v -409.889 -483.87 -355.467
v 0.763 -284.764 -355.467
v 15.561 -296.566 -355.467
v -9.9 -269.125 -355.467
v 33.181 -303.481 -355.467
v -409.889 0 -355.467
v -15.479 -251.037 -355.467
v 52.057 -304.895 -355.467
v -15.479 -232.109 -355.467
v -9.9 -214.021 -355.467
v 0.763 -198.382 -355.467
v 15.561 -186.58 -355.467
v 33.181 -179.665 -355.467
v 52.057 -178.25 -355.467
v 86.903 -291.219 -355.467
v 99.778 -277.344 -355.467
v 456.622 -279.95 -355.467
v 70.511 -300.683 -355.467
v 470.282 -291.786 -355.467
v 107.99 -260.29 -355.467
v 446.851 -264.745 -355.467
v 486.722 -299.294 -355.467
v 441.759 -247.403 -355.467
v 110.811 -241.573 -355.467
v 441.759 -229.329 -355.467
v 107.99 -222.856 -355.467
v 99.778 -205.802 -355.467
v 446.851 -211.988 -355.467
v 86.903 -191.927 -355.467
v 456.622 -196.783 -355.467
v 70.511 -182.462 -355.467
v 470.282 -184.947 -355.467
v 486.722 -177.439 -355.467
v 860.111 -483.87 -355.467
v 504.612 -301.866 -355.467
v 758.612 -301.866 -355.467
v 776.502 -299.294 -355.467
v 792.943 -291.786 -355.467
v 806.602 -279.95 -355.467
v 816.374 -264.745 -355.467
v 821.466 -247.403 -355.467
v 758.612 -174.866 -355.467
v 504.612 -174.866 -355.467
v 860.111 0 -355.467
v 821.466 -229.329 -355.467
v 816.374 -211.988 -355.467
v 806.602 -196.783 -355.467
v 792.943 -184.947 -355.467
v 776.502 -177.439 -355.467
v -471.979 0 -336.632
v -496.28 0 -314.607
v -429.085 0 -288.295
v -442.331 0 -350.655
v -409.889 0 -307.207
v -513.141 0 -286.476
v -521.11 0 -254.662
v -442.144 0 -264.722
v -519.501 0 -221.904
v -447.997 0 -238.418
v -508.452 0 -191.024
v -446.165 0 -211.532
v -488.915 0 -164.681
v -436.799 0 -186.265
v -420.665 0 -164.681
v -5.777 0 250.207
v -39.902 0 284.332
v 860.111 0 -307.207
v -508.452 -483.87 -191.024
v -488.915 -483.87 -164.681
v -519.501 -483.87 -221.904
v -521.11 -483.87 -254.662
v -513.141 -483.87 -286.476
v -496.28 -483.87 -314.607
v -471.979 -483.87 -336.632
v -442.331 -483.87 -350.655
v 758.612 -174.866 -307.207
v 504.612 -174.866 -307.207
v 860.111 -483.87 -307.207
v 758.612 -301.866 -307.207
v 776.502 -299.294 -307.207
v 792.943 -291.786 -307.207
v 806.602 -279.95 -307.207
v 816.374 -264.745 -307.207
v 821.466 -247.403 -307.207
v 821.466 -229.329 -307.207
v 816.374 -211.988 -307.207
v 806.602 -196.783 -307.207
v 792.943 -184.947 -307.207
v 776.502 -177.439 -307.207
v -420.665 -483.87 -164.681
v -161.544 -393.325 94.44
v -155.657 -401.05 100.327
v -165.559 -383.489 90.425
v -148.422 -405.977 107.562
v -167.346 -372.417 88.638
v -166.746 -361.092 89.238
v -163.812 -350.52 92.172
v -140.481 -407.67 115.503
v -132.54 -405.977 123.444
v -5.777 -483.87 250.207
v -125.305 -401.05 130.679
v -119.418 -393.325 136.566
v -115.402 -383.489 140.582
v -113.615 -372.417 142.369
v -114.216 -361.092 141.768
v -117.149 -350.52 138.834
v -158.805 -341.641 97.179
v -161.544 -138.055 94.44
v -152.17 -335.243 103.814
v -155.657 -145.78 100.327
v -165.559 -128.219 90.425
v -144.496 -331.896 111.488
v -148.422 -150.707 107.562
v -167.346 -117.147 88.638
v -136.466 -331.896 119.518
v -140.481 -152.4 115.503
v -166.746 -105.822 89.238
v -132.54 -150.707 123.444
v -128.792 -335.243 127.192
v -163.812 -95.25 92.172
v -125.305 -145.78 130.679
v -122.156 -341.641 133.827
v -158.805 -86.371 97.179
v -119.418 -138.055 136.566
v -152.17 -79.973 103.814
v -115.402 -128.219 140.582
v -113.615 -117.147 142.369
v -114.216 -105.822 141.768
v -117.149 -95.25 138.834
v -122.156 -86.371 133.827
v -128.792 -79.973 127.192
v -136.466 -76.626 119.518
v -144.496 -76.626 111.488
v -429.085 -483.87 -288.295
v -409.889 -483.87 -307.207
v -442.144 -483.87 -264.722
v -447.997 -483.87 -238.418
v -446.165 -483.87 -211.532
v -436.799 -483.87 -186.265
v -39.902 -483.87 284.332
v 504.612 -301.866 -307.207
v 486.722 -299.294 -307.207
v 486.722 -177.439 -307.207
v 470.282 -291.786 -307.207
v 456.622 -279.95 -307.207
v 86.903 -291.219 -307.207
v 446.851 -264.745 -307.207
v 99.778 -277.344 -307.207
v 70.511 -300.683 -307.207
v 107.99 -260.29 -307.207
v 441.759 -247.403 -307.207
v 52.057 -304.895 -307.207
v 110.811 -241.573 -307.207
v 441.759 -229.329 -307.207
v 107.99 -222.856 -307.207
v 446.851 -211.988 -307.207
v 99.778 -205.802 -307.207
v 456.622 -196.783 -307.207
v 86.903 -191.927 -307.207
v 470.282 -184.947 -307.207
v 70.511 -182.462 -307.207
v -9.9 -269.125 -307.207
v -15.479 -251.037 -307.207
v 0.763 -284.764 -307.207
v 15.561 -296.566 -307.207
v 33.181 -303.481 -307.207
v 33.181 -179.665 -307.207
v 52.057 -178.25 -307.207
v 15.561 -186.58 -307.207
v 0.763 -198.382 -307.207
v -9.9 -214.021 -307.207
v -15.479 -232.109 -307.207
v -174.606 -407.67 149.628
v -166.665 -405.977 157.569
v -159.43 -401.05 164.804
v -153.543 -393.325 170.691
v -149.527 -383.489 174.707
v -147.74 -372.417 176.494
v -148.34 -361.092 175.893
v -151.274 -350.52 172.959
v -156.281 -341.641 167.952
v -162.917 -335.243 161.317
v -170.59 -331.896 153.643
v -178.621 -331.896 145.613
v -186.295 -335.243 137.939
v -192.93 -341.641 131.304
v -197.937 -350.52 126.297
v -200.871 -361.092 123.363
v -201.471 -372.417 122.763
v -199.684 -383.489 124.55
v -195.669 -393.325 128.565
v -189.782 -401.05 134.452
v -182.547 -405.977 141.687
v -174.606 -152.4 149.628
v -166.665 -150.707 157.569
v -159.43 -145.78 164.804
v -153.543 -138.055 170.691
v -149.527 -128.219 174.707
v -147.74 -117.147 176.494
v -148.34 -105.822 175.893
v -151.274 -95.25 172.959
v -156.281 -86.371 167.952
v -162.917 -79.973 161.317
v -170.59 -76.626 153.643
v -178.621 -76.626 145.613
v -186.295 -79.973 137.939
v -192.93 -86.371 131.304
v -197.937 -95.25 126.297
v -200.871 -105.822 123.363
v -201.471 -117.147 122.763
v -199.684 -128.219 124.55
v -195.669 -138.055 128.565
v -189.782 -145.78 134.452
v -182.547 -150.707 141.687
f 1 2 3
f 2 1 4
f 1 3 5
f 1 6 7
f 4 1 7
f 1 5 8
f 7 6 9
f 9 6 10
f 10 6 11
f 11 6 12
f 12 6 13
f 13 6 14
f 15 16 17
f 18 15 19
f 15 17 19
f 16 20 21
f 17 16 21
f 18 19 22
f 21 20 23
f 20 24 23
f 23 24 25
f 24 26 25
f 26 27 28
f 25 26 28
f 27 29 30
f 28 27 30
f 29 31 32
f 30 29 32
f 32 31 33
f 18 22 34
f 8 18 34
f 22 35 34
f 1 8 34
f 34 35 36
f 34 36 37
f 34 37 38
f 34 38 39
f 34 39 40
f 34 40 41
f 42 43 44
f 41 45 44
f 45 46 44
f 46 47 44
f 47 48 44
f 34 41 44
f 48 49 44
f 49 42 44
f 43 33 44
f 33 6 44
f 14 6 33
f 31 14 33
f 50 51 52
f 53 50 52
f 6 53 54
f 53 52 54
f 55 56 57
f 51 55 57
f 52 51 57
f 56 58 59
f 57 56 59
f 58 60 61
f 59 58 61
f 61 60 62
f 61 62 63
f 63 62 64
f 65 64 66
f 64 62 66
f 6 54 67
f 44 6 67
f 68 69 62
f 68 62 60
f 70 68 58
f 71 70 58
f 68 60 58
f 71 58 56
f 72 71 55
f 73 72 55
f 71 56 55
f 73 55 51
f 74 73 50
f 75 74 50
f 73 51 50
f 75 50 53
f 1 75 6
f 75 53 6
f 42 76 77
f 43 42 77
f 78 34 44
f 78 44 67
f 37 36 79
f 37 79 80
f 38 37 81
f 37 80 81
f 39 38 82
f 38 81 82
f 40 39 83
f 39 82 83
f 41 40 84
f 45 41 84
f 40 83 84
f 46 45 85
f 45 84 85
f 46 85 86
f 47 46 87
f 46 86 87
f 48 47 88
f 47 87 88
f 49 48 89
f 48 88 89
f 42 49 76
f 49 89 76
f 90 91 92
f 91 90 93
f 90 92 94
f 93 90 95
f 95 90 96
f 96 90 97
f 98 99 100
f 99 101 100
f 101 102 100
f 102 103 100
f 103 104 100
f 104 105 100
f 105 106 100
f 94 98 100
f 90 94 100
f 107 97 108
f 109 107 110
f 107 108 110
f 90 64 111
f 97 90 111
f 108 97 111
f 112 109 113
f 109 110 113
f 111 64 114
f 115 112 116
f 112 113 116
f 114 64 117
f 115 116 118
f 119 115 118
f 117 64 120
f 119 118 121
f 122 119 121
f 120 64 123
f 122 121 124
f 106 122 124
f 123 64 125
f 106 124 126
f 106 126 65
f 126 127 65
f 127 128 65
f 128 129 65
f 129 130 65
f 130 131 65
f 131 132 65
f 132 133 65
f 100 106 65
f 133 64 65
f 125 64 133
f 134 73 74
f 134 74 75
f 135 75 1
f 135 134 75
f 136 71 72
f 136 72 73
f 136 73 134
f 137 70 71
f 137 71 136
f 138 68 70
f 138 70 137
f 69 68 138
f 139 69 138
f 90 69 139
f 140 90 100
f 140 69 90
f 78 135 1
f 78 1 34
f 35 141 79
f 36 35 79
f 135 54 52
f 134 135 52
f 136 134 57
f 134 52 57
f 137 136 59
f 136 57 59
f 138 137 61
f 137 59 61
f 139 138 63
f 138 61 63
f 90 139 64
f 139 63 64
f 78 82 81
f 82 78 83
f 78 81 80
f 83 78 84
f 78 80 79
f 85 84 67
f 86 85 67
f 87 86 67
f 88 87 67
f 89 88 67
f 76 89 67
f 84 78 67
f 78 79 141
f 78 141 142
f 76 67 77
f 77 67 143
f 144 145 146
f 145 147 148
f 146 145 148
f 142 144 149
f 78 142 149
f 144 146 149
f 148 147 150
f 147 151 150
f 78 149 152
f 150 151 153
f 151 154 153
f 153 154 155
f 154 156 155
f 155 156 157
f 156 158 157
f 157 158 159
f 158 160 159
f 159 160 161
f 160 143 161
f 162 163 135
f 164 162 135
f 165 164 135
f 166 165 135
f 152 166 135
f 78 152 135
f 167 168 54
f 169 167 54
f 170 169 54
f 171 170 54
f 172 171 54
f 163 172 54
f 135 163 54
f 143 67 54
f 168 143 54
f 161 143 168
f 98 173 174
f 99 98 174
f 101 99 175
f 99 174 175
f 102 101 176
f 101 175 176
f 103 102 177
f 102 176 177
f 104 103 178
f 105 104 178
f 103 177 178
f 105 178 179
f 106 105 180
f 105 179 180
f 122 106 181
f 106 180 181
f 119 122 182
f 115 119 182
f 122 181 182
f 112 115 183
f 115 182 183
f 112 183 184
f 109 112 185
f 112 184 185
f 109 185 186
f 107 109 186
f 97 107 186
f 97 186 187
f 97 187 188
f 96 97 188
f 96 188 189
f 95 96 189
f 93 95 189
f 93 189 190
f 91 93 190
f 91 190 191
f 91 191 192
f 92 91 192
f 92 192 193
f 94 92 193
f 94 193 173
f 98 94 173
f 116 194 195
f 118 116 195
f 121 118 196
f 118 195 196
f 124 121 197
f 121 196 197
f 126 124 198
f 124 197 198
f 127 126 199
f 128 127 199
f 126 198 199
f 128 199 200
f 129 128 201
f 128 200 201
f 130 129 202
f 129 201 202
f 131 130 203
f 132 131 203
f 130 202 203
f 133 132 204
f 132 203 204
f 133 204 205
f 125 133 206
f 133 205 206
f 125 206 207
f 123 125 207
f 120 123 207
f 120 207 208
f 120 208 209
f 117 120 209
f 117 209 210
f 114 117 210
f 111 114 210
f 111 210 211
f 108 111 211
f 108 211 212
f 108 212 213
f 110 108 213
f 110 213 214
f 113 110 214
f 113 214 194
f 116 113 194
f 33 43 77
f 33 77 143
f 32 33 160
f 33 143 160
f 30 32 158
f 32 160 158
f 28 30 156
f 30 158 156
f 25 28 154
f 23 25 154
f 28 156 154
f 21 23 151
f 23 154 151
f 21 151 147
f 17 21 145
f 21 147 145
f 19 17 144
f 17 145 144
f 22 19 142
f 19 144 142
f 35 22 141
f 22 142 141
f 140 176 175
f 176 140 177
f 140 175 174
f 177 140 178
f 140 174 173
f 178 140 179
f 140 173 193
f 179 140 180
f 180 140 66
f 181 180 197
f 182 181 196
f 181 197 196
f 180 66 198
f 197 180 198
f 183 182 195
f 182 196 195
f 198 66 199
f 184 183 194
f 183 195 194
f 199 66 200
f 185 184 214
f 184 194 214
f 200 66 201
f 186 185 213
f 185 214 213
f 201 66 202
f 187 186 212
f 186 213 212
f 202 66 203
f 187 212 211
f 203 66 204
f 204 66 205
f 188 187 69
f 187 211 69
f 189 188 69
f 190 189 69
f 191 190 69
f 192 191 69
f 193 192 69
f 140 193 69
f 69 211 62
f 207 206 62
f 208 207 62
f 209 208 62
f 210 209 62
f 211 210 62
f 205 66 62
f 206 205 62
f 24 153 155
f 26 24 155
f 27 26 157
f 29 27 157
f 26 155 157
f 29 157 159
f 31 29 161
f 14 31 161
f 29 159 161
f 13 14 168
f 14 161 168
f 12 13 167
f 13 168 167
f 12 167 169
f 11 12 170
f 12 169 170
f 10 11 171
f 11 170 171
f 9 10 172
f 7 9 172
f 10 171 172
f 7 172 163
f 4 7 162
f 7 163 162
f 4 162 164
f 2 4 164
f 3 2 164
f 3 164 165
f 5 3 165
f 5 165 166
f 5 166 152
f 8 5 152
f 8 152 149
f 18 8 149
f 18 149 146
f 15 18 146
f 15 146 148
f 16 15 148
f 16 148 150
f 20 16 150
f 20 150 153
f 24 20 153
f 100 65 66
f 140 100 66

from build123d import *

# Parameters (mm, degrees)
F1_DEPTH = 483.87
F2_R     = 63.5
F3_DEPTH = 307.34
F4_R     = 38.1
F5_DEPTH = 170.18


with BuildPart() as f1:
    # F0 (on Front) → F1 (new body)
    with BuildSketch(Plane.XZ):
        with BuildLine():
            Line((-5.7769804876, 250.2069493125), (-39.9019537476, 284.3319225726))
            Line((-39.9019537476, 284.3319225726), (-488.9147598011, -164.6808834809))
            ThreePointArc((-488.9147598011, -164.6808834809), (-513.1412824891, -286.4758377474), (-409.8885059357, -355.4671373463))
            Line((-409.8885059357, -355.4671373463), (860.1114940643, -355.4671373463))
            Line((860.1114940643, -355.4671373463), (860.1114940643, -307.2071373463))
            Line((860.1114940643, -307.2071373463), (-409.8885059357, -307.2071373463))
            ThreePointArc((-409.8885059357, -307.2071373463), (-447.9966898633, -238.4179483219), (-420.664813281, -164.6808834809))
            Line((-420.664813281, -164.6808834809), (-5.7769804876, 250.2069493125))
        make_face()
    extrude(amount=F1_DEPTH)

    # F2 (on face) → F3 (cut)
    with BuildSketch(Plane.XY.offset(-307.2071373463)):
        with Locations((47.3114940643, -241.5729016066)):
            Circle(F2_R)
        with BuildLine():
            Line((758.6122675238, -174.8664157407), (504.6122675238, -174.8664157407))
            ThreePointArc((504.6122675238, -174.8664157407), (441.1122675238, -238.3664157407), (504.6122675238, -301.8664157407))
            Line((504.6122675238, -301.8664157407), (758.6122675238, -301.8664157407))
            ThreePointArc((758.6122675238, -301.8664157407), (822.1122675238, -238.3664157407), (758.6122675238, -174.8664157407))
        make_face()
    extrude(amount=-F3_DEPTH, mode=Mode.SUBTRACT)

    # F4 (on face) → F5 (cut)
    with BuildSketch(Plane(origin=(-162.1169381601, 0, 162.1169381601), x_dir=(0, -1, 0), z_dir=(-0.7071067812, 0, 0.7071067812))):
        with Locations((114.3, -17.6619115186)):
            Circle(F4_R)
        with Locations((369.57, -17.6619115186)):
            Circle(F4_R)
    extrude(amount=-F5_DEPTH, mode=Mode.SUBTRACT)


solid = f1.part
